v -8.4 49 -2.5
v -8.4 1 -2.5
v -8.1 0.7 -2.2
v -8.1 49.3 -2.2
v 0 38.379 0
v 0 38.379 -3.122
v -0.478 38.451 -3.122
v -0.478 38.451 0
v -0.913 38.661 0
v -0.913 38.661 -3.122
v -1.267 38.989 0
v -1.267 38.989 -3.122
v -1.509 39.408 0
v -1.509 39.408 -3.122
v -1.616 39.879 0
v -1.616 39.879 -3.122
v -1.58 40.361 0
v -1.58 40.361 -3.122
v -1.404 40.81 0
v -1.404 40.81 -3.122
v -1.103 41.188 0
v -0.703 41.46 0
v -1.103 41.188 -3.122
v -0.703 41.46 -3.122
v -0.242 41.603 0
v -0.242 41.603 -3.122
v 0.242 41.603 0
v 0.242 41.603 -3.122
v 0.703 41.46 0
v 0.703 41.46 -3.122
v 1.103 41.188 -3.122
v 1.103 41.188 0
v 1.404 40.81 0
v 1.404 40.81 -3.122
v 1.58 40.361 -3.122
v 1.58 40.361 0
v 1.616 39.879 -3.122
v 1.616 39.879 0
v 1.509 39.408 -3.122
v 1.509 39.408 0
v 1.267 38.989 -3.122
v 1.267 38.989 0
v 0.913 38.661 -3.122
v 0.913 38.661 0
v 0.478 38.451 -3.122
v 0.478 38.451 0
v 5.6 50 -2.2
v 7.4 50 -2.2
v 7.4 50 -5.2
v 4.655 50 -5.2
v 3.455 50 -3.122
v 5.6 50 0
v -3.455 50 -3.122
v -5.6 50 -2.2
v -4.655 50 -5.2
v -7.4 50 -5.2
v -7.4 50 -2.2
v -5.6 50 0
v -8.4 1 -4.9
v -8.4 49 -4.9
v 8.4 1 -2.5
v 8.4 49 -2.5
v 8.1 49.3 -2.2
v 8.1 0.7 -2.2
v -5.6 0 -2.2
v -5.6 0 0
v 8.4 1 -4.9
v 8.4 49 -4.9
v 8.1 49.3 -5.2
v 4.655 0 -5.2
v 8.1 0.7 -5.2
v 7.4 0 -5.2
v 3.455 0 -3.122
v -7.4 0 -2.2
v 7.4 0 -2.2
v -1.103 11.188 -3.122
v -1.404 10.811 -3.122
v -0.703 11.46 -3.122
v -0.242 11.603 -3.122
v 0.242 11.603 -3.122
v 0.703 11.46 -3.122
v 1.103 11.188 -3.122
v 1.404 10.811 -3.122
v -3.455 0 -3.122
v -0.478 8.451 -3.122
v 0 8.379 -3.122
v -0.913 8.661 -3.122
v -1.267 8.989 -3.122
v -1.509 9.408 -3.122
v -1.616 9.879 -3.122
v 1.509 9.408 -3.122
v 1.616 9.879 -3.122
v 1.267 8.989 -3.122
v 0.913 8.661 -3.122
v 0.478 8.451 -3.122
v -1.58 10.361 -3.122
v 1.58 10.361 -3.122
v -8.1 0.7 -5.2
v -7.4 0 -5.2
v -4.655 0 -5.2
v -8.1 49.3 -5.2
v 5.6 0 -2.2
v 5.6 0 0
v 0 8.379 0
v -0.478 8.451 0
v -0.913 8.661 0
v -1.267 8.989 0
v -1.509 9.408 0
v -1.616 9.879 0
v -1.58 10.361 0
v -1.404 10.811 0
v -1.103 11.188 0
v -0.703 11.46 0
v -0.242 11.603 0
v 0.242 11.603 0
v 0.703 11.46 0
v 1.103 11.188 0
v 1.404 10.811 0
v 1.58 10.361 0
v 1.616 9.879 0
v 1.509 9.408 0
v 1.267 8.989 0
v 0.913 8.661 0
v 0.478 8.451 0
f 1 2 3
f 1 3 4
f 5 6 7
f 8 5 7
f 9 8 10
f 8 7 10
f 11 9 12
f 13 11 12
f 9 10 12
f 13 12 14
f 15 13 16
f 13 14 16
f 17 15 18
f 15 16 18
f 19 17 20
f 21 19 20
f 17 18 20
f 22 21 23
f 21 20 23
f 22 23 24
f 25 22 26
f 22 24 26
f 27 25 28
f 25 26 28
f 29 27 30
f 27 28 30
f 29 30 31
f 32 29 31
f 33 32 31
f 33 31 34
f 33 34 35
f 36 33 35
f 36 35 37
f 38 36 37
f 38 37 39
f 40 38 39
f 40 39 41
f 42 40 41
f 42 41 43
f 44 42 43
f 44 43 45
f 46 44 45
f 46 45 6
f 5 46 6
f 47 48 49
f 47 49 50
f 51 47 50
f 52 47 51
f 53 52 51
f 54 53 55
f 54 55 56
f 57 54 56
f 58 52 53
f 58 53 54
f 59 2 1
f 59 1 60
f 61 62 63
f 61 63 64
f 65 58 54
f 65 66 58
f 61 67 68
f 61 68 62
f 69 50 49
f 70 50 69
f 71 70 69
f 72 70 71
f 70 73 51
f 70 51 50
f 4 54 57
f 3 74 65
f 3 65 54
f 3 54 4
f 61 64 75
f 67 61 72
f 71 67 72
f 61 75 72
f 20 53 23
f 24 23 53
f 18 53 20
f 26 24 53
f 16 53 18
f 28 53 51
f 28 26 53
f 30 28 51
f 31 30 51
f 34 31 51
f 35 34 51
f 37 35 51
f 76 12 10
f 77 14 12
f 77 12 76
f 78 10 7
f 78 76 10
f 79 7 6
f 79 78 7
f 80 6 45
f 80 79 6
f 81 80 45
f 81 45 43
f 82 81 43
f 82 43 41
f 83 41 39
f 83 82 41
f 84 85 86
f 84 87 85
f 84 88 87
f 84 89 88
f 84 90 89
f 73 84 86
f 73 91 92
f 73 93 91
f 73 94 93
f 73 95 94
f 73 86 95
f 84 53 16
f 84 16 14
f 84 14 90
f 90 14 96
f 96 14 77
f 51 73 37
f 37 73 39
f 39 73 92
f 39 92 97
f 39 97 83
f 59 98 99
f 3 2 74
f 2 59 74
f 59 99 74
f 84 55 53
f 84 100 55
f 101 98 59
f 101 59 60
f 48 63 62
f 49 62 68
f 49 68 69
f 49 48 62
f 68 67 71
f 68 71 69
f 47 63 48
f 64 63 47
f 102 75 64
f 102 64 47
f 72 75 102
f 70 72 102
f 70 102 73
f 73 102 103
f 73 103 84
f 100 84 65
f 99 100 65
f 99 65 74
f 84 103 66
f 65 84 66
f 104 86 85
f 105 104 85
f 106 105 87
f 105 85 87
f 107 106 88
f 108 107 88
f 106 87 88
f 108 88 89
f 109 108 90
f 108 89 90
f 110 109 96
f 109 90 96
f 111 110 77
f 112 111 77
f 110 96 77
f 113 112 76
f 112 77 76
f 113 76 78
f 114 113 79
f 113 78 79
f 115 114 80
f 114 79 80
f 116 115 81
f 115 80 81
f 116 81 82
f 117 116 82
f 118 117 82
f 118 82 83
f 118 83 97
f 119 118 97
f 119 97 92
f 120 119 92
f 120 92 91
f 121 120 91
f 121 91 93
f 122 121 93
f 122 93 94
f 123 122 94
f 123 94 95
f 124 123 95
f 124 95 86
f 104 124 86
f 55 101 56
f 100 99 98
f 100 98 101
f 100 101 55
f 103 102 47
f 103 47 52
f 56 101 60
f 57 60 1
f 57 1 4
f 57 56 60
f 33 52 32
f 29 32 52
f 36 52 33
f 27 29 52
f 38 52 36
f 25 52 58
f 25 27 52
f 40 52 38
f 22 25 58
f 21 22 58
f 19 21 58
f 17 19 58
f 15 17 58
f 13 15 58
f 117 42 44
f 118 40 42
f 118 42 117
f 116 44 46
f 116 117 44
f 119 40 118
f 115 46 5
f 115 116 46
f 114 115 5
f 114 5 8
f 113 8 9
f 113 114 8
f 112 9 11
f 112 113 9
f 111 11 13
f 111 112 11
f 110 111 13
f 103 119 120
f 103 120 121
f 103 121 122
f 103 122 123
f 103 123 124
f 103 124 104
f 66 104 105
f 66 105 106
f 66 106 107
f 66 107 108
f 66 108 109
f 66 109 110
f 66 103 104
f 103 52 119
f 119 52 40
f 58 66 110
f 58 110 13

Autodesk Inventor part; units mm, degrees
ref_plane "YZ Plane" through (0, 0, 0) normal (1, 0, 0) x (0, 1, 0)
ref_plane "XZ Plane" through (0, 0, 0) normal (0, 1, 0) x (-1, 0, 0)
ref_plane "XY Plane" through (0, 0, 0) normal (0, 0, 1) x (1, 0, 0)
sketch "スケッチ1" plane through (0, 0, 0) normal (0, 1, 0) x (-1, 0, 0)
  line L0 (-5.6, 0) -> (5.6, 0)
  line L1 (5.6, 0) -> (5.6, -2.2)
  line L2 (5.6, -2.2) -> (8.4, -2.2)
  line L3 (8.4, -2.2) -> (8.4, -5.2)
  line L4 (8.4, -5.2) -> (4.6551, -5.2)
  line L5 (4.6551, -5.2) -> (3.4551, -3.1215)
  line L6 (3.4551, -3.1215) -> (-3.4551, -3.1215)
  line L7 (-3.4551, -3.1215) -> (-4.6551, -5.2)
  line L8 (-4.6551, -5.2) -> (-8.4, -5.2)
  line L9 (-8.4, -5.2) -> (-8.4, -2.2)
  line L10 (-8.4, -2.2) -> (-5.6, -2.2)
  line L11 (-5.6, -2.2) -> (-5.6, 0)
  point P0 (0, 0)
  point P1 (0, 0)
  point P2 (0, -3.1215)
  dimension "d0" = 11.2
  dimension "d1" = 5.2
  dimension "d2" = 16.8
  dimension "d3" = 120
  dimension "d4" = 120
  dimension "d5" = 3
extrude "押し出し1" add sketch "スケッチ1" along normal blind 50
chamfer "面取り1" [suppressed]
chamfer "面取り2" distance 1 angle 45 4 edges at (8.4, 0, -3.7) (-8.4, 0, -3.7) (8.4, 50, -3.7) (-8.4, 50, -3.7)
chamfer "面取り3" distance 0.3 angle 45 4 edges at (-8.4, 25, -2.2) (-8.4, 25, -5.2) (8.4, 25, -5.2) (8.4, 25, -2.2)
sketch "スケッチ2" plane through (-5.6, 0, 0) normal (0, 0, 1) x (1, 0, 0)
  line L0 (5.6, 10) -> (5.6, 40) construction
  line L1 (13.7, 49.3) -> (13.7, 0.7) construction
  line L2 (0, 0) -> (11.2, 0) construction
  point P0 (5.6, 0)
  point P1 (5.6, 25)
  point P2 (13.7, 25)
  point P3 (5.6, 0)
  dimension "d17" = 30
hole "穴1" at (0, 10, 0) at (0, 40, 0) direction (0, 0, -1) diameter 3.242 end through all thread size "M4x0.7" class "6H" standard "ANSI Metric M Profile"
properties part number "MR-20CS" material "ポリエチレン、高密度"
